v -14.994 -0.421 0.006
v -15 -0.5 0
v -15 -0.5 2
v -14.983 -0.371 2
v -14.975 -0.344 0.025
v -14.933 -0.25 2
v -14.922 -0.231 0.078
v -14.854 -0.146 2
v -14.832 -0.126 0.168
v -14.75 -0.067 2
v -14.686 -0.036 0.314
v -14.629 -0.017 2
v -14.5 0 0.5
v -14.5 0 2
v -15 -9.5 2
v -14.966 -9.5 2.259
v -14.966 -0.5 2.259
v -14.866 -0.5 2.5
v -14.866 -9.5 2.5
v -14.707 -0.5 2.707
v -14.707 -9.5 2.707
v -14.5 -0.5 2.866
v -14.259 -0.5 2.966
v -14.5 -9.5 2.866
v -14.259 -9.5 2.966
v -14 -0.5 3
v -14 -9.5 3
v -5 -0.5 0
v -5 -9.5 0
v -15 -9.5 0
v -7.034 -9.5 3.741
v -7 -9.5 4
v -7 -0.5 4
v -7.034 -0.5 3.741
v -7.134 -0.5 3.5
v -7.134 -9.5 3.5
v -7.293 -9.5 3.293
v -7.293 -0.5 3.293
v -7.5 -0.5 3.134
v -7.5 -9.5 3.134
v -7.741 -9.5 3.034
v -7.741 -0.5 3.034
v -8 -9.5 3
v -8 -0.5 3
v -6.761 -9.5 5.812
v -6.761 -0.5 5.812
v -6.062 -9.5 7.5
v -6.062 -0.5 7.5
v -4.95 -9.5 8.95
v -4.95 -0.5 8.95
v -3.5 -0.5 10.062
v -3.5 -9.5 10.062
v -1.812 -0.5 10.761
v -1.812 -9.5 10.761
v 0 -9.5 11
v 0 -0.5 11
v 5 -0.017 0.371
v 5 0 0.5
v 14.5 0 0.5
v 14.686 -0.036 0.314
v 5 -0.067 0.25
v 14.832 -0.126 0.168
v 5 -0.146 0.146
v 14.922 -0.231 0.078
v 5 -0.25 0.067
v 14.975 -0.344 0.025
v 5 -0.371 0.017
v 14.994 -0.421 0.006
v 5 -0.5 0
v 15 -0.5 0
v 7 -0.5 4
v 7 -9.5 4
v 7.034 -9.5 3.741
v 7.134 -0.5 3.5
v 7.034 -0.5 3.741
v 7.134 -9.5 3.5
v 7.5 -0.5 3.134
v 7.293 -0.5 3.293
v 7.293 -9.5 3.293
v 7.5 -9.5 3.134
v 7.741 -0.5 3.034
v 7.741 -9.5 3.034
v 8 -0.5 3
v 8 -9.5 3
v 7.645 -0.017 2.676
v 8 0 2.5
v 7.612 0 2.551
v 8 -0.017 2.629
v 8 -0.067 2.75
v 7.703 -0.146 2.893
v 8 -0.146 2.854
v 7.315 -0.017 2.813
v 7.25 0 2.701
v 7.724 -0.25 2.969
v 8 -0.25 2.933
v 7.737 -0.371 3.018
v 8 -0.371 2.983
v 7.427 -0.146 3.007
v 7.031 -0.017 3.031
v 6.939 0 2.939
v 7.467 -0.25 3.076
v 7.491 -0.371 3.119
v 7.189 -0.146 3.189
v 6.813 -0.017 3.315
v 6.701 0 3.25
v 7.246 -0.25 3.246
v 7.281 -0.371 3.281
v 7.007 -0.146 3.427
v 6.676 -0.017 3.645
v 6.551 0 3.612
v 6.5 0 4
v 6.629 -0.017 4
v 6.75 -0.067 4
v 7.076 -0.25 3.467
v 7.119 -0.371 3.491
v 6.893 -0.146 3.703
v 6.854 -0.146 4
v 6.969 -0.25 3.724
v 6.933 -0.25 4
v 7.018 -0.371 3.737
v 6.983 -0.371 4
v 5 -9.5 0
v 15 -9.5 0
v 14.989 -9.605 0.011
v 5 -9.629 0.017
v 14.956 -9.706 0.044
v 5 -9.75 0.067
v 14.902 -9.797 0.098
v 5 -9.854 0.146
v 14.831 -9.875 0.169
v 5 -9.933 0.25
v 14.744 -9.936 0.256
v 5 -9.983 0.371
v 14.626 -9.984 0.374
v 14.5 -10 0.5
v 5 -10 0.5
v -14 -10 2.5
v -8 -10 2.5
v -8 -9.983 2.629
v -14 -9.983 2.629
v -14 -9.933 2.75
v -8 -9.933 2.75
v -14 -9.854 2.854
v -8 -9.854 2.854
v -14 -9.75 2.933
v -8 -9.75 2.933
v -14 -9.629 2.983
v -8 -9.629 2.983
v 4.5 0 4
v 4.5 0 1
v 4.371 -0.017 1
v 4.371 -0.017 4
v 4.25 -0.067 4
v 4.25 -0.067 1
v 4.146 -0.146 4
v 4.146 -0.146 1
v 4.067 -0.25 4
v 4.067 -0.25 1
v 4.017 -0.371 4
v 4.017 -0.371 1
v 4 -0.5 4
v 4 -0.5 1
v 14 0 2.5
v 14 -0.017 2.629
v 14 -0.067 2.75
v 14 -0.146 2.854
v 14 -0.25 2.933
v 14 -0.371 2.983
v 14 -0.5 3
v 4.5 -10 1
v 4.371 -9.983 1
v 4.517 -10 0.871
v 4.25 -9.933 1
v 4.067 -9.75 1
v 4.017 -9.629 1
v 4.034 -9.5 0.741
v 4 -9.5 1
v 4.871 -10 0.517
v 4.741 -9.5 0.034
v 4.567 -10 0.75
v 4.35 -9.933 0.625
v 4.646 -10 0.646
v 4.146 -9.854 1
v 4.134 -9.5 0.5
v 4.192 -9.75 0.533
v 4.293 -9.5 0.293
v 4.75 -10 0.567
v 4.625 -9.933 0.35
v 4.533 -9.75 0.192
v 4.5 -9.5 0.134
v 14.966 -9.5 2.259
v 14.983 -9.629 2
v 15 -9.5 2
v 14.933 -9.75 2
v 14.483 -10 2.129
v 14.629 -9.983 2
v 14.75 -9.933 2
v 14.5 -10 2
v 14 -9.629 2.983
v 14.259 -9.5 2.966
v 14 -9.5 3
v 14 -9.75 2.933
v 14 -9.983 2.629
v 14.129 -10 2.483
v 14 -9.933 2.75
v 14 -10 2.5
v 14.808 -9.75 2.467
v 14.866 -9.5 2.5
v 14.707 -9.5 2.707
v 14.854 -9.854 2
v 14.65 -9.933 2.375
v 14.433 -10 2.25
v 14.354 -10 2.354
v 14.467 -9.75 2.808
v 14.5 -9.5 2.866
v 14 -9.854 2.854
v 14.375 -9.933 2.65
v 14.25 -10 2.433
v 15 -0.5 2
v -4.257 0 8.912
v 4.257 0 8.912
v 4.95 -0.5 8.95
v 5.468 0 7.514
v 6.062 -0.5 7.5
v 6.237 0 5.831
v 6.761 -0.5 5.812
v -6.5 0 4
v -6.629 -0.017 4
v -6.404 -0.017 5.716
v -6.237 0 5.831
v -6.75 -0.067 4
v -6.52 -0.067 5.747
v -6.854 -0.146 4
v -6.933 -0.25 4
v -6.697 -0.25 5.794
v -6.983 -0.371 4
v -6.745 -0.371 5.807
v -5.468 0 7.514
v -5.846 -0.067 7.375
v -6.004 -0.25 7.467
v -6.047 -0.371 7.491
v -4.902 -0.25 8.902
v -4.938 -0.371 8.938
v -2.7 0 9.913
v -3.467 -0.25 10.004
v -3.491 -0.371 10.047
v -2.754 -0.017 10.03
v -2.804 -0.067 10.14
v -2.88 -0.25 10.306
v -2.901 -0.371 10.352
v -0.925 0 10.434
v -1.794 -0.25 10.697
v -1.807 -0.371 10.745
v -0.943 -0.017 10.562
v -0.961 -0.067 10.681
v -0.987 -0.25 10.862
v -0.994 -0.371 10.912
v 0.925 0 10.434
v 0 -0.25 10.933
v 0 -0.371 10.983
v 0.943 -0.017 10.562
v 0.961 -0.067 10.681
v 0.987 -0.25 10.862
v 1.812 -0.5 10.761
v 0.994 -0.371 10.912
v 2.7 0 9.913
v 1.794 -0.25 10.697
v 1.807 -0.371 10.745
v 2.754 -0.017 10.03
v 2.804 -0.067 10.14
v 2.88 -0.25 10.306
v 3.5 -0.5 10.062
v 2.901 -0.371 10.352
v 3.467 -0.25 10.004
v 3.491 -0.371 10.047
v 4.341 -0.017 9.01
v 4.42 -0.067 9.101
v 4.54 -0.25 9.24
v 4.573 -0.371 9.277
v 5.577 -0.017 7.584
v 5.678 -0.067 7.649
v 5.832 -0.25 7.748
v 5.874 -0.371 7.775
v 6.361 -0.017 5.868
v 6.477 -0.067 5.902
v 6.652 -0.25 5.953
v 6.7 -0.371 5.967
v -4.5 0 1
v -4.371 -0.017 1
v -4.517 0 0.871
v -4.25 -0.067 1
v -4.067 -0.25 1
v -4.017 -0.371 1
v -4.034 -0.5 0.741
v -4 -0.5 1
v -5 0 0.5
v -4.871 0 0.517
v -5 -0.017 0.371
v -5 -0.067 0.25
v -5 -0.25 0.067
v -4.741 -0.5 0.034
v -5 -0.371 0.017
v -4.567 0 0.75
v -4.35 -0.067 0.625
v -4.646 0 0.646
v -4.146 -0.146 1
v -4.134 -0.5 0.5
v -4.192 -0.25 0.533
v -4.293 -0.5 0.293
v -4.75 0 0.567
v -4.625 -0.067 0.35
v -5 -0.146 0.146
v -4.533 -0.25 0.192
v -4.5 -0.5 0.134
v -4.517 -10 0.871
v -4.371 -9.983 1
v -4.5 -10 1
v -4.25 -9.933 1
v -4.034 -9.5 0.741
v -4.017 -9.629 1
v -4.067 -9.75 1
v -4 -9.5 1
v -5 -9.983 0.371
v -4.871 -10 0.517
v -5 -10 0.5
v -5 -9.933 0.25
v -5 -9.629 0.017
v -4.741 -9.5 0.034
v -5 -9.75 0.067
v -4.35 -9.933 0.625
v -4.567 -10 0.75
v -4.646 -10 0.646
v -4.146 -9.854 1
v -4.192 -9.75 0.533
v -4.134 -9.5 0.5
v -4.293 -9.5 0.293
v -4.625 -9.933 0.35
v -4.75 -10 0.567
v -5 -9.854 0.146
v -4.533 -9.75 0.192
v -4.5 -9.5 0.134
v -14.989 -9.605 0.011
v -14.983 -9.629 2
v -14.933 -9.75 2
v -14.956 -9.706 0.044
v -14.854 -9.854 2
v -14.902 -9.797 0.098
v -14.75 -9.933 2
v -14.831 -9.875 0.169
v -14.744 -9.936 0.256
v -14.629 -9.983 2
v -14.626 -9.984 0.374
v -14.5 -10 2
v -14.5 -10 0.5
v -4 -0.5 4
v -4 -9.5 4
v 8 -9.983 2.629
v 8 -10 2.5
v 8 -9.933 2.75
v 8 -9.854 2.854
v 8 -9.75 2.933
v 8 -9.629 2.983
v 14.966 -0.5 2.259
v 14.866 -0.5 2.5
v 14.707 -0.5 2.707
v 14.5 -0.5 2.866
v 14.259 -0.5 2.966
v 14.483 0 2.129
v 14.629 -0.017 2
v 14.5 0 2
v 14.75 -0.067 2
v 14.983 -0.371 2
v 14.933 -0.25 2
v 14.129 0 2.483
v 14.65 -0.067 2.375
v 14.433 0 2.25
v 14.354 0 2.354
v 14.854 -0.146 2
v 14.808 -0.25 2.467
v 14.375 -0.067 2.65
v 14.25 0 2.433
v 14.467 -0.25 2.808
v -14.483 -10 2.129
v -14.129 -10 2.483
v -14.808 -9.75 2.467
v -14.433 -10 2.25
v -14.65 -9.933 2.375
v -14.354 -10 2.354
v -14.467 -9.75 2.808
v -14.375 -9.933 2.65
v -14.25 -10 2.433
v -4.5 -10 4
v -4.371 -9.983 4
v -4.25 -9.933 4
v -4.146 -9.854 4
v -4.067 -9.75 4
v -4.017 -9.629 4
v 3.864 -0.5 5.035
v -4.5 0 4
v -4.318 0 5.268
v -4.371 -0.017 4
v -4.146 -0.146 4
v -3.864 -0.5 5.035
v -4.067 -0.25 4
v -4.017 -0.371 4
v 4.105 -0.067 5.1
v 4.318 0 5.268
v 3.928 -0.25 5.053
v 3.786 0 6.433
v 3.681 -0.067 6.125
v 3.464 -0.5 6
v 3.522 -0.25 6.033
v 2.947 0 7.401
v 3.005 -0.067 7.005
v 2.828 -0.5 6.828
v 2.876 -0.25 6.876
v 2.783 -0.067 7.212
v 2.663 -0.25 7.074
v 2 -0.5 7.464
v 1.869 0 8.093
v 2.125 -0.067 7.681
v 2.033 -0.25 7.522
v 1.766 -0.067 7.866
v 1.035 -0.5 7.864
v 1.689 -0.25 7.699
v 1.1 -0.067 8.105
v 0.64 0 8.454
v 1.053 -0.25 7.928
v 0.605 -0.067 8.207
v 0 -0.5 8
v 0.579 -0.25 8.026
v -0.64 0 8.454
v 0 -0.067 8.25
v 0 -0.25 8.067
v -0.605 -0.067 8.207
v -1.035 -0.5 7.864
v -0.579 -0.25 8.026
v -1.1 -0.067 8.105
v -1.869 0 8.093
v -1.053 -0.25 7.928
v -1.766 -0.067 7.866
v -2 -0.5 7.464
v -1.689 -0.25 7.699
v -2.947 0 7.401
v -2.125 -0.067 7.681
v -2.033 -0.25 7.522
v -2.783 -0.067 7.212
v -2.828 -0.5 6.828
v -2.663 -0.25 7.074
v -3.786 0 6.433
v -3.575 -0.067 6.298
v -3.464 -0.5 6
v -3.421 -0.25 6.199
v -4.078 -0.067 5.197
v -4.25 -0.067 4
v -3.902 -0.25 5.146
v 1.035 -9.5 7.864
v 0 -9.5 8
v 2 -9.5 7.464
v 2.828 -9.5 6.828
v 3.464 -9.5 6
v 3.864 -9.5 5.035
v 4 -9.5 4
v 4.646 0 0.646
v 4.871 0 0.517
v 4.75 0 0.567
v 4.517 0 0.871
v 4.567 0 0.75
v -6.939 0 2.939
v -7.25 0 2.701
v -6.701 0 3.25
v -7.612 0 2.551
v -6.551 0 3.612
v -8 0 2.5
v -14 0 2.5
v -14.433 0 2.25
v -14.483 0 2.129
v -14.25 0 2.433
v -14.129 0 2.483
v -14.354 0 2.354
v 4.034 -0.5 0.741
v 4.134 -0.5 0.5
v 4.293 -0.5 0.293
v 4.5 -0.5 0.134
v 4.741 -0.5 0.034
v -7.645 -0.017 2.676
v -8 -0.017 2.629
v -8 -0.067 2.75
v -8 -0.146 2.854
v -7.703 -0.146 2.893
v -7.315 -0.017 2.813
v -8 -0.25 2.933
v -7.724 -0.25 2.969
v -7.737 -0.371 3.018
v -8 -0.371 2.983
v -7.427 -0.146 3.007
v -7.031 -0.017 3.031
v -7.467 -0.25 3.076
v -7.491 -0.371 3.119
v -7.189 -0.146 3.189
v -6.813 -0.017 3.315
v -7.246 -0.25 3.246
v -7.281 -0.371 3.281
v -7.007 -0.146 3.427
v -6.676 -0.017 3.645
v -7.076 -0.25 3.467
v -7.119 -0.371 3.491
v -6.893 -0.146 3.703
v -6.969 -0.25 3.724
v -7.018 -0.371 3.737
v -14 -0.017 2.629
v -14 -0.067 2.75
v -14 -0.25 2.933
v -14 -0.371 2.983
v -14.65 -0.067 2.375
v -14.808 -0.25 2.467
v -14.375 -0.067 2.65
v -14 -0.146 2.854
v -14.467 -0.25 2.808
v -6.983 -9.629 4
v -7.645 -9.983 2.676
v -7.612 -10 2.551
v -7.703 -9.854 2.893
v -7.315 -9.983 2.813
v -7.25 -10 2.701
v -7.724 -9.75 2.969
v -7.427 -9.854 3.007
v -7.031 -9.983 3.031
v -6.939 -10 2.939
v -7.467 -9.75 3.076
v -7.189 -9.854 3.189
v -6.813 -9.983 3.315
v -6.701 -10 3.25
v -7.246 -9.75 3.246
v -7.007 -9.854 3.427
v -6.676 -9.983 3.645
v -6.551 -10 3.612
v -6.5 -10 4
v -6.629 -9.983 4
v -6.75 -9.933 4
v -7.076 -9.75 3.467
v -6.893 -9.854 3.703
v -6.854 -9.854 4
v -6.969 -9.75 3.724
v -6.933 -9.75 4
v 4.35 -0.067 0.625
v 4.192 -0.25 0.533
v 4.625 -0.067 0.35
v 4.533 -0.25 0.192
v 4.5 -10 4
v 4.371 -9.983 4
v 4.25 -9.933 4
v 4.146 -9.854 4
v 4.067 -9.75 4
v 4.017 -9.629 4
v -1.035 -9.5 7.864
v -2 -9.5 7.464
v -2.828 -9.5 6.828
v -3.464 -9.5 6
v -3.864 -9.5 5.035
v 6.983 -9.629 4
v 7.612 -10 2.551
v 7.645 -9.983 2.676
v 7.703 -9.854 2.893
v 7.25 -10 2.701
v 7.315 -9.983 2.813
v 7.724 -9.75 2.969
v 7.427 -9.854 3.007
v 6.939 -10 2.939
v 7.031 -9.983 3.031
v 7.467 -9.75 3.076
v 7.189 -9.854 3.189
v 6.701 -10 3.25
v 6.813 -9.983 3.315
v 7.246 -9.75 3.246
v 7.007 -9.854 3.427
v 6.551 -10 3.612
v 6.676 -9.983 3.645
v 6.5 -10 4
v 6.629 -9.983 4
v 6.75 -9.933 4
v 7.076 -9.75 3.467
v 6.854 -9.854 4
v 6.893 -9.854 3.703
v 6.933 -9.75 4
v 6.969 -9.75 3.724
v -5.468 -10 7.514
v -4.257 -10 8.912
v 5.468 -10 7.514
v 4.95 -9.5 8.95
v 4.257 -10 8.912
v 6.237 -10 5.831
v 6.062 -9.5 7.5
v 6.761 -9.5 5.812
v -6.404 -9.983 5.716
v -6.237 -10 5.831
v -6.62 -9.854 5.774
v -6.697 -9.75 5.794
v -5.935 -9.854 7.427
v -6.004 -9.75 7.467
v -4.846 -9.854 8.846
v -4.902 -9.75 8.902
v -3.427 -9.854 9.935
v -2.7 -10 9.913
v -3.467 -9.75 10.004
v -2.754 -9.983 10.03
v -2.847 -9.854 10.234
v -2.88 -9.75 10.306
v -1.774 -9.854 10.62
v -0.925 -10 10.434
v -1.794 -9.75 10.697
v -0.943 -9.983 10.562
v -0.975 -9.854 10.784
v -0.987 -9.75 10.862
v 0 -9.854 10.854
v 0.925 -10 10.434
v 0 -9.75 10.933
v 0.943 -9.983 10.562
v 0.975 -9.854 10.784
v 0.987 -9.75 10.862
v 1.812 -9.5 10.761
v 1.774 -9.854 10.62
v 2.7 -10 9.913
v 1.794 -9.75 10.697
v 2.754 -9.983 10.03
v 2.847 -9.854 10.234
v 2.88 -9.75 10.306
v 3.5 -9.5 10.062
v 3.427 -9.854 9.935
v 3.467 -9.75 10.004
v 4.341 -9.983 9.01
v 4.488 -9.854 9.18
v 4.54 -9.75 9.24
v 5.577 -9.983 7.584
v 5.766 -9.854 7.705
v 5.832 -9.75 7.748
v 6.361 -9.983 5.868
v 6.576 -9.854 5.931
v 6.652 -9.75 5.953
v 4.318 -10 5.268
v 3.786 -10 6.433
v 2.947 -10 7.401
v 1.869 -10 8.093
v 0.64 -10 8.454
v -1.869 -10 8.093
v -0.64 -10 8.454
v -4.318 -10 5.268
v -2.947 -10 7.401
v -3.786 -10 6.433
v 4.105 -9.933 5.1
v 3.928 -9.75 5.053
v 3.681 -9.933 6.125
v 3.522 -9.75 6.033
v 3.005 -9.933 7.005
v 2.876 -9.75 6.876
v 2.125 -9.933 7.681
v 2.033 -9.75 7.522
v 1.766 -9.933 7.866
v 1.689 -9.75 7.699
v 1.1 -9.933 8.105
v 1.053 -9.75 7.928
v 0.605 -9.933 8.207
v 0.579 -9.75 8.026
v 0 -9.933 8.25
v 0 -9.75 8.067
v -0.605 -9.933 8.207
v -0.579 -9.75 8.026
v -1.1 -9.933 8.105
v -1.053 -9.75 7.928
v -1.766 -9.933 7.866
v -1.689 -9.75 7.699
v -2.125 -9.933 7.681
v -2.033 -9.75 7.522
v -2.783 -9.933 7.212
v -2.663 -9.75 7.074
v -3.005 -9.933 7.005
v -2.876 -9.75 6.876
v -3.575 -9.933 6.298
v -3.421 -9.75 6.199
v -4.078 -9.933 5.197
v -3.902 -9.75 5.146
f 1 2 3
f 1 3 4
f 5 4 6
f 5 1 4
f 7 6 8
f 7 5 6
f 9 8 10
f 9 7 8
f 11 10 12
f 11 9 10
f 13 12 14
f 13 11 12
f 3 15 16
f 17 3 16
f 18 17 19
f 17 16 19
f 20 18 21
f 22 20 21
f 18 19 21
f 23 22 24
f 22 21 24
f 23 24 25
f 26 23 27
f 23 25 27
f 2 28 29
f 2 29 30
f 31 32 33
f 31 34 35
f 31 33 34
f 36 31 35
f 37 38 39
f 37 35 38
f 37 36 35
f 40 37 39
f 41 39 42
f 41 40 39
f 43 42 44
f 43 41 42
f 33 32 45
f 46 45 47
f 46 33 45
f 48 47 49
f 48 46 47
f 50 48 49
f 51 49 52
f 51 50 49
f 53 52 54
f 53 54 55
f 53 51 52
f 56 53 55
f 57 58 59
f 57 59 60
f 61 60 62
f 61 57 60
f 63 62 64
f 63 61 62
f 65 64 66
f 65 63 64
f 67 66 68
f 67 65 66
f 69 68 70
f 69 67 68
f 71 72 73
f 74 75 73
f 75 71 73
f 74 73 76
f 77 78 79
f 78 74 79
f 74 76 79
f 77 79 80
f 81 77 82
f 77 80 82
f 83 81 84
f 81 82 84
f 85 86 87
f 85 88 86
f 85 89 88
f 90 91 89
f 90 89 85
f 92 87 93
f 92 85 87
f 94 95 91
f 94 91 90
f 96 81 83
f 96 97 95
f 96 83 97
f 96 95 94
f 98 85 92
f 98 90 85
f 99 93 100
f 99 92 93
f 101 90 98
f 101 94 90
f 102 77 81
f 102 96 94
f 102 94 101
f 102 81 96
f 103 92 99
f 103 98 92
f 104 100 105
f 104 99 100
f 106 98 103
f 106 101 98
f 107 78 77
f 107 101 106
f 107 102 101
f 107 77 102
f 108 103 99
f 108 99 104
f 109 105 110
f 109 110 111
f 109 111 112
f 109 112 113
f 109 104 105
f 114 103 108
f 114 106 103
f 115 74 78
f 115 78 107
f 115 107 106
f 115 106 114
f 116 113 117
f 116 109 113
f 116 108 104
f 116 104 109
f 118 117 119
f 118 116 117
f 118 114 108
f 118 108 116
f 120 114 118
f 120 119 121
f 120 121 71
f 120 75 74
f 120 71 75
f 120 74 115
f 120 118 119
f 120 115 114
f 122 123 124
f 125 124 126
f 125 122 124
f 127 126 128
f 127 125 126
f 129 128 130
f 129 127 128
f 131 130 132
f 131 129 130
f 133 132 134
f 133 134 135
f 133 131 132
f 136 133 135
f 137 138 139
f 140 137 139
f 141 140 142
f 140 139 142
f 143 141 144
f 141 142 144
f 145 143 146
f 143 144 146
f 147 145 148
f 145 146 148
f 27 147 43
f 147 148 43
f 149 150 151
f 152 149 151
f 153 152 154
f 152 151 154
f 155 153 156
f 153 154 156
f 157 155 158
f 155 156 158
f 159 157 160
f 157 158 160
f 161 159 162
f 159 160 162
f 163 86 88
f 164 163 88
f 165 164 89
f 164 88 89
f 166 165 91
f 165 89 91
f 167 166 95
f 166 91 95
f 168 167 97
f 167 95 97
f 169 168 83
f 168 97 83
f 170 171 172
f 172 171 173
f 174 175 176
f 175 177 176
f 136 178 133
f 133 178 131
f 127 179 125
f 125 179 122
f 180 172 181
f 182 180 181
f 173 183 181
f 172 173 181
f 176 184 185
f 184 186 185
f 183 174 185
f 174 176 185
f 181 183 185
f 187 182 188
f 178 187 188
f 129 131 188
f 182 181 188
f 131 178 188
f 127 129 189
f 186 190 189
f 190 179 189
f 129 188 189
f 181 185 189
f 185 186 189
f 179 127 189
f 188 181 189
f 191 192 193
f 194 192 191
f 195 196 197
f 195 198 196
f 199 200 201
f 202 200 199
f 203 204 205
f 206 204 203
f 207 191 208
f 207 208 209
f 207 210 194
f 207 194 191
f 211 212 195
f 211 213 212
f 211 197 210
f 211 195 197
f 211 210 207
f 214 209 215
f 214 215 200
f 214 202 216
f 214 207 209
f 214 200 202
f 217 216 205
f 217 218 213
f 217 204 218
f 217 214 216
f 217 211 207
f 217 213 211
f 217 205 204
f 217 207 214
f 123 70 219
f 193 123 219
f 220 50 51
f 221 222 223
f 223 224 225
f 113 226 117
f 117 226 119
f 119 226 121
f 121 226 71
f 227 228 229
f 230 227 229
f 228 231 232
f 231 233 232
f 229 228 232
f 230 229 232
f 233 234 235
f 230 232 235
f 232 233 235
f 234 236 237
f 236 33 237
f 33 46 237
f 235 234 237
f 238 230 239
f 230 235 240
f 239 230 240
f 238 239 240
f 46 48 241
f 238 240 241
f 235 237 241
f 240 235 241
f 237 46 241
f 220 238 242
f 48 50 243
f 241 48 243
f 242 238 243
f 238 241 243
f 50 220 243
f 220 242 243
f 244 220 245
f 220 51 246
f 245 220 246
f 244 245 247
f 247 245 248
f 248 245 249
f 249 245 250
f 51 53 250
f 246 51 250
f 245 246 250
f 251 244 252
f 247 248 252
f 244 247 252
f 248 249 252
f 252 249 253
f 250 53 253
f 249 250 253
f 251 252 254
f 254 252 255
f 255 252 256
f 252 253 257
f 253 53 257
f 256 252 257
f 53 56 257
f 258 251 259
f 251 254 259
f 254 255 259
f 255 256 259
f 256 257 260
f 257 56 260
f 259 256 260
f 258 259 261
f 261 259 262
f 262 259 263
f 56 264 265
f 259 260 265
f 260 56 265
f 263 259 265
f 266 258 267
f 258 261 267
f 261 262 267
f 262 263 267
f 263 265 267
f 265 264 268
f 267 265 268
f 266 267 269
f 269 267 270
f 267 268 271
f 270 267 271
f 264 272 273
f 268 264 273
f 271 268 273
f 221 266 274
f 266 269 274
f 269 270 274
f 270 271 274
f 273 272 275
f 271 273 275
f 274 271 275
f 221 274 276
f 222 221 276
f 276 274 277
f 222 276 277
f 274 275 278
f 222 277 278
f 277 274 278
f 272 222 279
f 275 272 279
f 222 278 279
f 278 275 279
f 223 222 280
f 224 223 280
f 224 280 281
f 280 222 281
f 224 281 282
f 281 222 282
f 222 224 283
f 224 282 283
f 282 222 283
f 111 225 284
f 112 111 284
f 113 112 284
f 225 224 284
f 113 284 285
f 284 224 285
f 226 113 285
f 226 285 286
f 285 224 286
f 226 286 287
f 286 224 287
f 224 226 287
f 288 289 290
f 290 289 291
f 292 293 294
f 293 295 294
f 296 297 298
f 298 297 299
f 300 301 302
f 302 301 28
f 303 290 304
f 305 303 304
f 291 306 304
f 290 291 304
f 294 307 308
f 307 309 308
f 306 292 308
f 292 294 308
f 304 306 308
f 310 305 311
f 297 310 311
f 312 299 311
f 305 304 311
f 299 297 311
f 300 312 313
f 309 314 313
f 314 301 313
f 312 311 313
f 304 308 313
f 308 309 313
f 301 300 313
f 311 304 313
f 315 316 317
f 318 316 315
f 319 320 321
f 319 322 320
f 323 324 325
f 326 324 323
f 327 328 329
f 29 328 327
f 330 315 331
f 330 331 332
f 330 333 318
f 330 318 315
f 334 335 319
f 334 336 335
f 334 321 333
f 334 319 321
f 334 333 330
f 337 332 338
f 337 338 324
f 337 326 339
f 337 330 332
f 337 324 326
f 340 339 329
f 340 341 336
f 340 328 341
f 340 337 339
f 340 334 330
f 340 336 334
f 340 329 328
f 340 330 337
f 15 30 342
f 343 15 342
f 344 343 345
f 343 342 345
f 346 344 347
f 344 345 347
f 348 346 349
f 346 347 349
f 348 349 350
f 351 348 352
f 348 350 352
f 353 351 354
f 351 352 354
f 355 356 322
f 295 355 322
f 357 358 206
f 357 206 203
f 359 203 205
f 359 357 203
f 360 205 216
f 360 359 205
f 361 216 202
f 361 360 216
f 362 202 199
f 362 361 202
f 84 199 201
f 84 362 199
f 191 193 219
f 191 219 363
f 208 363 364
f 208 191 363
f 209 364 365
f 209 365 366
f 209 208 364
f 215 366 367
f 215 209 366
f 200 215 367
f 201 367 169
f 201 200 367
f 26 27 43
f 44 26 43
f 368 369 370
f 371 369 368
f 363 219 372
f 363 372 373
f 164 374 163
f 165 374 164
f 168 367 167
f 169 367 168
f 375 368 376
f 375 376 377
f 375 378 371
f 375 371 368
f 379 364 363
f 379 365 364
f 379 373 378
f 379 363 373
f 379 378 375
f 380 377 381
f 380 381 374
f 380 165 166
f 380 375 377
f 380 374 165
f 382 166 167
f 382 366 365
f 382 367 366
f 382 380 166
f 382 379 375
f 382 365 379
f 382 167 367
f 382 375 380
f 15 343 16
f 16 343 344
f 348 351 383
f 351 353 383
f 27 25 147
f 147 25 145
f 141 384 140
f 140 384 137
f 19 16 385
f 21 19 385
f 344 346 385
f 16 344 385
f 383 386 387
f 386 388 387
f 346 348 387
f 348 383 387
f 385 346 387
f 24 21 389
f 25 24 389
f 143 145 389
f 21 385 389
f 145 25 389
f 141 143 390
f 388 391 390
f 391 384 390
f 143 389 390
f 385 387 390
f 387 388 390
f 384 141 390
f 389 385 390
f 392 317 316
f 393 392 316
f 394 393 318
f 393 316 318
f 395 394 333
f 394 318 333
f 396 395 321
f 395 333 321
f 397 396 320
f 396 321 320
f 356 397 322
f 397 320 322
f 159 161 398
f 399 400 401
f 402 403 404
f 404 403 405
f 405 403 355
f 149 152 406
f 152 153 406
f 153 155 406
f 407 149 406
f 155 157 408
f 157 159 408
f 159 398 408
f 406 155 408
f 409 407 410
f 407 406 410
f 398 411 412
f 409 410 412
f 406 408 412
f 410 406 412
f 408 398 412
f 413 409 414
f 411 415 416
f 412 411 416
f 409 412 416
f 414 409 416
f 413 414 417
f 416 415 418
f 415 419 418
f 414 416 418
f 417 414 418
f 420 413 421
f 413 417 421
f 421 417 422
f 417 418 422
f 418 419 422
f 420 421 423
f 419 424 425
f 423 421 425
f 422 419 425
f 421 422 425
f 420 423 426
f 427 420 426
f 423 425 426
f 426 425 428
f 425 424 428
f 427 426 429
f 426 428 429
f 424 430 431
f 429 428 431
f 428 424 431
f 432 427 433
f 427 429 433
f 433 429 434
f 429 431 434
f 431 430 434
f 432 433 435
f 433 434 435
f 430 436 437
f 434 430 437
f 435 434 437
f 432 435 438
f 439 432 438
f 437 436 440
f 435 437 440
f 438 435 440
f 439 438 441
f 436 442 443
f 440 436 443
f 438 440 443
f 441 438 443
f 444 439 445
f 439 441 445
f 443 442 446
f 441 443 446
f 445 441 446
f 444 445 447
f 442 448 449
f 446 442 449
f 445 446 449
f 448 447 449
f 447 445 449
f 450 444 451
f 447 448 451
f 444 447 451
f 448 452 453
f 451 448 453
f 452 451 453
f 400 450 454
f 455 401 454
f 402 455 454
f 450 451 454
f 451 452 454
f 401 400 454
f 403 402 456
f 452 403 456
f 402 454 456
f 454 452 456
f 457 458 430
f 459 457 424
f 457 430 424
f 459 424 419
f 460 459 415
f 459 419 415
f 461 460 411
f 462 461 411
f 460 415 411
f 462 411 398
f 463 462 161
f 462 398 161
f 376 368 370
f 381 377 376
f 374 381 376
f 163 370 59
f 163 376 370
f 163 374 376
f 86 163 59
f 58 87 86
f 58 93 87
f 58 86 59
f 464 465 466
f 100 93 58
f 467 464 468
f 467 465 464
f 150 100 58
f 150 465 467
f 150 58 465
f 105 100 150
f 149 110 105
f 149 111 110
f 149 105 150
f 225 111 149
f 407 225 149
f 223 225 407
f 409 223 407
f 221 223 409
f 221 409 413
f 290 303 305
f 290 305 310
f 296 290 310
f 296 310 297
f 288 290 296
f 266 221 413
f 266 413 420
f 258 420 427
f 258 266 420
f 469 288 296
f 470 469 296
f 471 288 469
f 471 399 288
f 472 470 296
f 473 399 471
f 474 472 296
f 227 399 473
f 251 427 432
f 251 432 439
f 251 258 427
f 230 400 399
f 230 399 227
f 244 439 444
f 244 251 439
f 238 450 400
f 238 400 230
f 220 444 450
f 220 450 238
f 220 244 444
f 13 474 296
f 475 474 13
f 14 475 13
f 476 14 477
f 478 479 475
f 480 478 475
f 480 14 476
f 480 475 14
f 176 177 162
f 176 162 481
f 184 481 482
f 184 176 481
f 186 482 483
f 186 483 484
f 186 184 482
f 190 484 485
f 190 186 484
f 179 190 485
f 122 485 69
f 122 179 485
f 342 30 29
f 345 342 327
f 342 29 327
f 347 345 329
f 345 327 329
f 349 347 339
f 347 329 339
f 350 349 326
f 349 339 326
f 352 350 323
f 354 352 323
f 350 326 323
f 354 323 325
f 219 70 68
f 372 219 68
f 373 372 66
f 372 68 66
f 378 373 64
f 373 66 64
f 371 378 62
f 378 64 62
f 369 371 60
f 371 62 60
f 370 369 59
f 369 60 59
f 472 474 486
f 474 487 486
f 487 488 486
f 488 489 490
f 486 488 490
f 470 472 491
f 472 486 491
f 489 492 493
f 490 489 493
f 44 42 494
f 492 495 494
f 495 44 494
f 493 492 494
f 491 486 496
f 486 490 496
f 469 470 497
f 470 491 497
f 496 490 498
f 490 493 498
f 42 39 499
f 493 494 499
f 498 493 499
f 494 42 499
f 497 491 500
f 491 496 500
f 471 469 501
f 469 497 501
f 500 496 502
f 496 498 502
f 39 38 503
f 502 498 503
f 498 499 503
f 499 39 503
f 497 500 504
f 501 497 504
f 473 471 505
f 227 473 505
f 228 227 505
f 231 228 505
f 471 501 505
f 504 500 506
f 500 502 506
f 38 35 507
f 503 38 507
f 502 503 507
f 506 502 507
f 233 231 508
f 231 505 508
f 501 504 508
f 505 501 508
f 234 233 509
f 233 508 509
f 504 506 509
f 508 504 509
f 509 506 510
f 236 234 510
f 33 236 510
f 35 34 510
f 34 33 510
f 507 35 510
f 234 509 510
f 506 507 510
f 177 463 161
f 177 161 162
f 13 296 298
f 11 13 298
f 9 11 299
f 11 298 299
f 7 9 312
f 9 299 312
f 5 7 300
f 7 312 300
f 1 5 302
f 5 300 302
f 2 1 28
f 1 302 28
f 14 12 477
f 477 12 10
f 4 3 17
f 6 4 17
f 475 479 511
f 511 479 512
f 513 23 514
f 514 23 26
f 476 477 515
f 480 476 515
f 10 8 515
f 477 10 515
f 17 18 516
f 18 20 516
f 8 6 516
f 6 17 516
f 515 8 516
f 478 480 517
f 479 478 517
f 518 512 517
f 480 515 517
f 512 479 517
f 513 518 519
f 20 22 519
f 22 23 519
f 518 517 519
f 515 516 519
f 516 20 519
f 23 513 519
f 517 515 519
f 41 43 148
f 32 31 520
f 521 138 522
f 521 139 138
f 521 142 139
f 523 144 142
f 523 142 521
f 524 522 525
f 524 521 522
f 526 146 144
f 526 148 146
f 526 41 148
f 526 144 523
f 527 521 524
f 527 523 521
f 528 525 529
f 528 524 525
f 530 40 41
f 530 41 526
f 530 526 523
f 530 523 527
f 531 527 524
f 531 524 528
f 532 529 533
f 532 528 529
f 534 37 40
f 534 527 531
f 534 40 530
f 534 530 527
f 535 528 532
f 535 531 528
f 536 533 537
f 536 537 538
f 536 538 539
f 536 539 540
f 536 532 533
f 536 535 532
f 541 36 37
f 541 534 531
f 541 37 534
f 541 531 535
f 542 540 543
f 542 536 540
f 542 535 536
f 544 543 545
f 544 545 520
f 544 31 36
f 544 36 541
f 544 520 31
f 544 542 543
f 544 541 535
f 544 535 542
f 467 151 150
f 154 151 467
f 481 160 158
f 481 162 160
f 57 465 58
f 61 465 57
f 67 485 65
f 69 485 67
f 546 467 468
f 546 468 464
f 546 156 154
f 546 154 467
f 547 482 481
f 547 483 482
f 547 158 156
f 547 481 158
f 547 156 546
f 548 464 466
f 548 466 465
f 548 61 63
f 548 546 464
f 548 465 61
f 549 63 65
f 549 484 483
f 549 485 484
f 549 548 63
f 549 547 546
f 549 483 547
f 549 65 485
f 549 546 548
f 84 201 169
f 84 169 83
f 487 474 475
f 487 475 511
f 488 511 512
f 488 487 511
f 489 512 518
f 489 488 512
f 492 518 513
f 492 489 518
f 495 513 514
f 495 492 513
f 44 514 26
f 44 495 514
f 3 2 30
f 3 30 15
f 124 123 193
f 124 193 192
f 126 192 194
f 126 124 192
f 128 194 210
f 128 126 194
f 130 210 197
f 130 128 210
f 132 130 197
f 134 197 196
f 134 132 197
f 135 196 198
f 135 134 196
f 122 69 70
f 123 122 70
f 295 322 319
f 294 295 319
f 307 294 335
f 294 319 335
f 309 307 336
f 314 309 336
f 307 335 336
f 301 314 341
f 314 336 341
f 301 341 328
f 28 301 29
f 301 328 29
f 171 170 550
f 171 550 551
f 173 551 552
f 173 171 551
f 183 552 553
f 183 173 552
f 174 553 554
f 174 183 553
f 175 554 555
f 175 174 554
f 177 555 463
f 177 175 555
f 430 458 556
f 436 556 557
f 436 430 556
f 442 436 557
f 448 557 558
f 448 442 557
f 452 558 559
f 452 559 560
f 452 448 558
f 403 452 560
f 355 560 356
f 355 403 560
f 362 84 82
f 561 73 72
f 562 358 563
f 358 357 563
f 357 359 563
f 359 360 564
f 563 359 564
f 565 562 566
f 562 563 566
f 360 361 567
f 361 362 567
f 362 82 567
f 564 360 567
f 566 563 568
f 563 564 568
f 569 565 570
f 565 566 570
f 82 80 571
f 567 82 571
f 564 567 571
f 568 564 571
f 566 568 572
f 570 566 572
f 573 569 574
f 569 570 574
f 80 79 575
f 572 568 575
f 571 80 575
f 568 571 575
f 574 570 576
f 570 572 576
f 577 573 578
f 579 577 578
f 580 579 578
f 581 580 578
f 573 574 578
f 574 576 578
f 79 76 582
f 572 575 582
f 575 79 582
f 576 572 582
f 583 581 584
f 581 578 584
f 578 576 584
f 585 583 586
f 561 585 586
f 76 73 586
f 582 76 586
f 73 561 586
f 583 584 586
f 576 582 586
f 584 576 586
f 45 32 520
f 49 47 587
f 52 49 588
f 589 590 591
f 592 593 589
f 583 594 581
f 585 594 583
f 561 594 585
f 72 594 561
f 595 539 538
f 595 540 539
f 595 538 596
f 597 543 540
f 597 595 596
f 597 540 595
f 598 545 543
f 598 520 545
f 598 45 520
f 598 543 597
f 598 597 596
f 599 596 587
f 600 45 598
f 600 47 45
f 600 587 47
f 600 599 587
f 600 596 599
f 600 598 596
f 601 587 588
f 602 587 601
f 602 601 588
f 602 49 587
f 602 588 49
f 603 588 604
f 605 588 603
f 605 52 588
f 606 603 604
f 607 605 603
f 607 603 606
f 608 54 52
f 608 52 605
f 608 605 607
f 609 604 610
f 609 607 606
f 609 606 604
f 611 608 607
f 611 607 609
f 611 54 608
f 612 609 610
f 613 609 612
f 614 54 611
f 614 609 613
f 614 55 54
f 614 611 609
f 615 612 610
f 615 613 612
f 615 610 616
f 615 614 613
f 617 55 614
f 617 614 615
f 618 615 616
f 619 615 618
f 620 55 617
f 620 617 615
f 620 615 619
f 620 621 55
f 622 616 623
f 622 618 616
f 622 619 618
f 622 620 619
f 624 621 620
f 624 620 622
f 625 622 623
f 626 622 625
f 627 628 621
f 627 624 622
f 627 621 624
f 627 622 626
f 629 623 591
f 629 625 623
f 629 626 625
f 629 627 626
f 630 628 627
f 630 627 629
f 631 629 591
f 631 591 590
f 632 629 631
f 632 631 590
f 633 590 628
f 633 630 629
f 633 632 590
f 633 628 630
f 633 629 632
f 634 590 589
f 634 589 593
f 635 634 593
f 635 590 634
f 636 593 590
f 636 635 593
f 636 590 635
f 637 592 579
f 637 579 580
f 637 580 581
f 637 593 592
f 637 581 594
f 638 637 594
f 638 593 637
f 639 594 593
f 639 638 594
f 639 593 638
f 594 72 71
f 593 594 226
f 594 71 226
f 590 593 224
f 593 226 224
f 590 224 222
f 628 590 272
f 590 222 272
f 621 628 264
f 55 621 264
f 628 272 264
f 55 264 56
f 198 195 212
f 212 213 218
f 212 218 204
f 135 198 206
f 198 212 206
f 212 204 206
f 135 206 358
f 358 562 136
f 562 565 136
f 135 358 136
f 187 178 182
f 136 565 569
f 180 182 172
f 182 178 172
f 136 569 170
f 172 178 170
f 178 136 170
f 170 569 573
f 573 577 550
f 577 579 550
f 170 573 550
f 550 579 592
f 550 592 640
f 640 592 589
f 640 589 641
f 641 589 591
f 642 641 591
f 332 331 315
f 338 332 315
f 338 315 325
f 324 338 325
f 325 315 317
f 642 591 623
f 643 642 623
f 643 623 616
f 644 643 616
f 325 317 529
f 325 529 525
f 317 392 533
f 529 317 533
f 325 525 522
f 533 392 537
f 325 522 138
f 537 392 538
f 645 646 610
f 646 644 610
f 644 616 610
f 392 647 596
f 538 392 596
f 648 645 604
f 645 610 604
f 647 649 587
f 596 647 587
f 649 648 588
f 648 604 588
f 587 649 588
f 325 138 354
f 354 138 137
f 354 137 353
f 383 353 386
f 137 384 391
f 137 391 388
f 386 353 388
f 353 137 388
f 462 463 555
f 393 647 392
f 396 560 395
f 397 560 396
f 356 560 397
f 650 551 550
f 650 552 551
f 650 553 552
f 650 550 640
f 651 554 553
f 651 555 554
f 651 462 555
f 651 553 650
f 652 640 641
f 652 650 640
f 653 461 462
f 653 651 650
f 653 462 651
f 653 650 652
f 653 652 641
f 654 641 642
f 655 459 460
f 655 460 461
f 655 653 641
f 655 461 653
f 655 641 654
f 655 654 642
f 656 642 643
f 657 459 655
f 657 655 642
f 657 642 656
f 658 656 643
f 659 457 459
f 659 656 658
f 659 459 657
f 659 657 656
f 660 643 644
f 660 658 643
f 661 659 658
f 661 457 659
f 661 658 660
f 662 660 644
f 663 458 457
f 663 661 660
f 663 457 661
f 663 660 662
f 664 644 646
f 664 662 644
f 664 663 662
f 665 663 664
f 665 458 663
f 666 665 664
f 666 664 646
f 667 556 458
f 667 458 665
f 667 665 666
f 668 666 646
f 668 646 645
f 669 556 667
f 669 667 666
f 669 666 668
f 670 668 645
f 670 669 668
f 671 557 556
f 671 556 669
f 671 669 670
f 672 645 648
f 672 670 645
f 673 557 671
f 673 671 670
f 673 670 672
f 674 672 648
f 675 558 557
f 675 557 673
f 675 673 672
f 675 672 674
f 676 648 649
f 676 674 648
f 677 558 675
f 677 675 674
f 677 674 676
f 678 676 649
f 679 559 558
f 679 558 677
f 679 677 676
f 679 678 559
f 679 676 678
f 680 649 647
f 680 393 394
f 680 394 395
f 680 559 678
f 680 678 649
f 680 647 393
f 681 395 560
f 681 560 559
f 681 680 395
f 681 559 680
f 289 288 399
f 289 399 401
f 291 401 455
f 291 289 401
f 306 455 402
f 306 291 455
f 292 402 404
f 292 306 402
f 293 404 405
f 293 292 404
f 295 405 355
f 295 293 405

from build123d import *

# Parameters (mm, degrees)
F1_DEPTH     = 10
F2_R         = 0.99999
F3_T1_DEPTH  = 1e-05
F3_T3_DEPTH  = 3.00001
F3_T5_DEPTH  = 11.25001
F3_T7_DEPTH  = 6.00002
F3_T9_DEPTH  = 3.25001
F3_T12_ANGLE = 107.9121236547
F3_T14_ANGLE = 100.2354992312
F3_T16_ANGLE = 90
F3_T18_ANGLE = 107.9121236547
F3_T20_ANGLE = 90
F3_T22_ANGLE = 100.2354992312
F3_T24_ANGLE = 90
F3_T26_ANGLE = 90
F3_T28_ANGLE = 90
F3_T30_ANGLE = 90


# Not quite as in the source:
# - a fillet or chamfer that OpenCascade refuses, or shapes differently, is made with other operations: its cross-section is extruded or revolved along the edge and cut away or added
# - a fillet or chamfer is up to 0.001 mm smaller than in the source, because OpenCascade refuses the exact size


with BuildPart() as f1:
    # F0 (on Front) → F1 (new body)
    with BuildSketch(Plane.XZ):
        with BuildLine():
            Line((7, 3), (7, 4))
            ThreePointArc((7, 4), (6.6787700412, 1.9038056538), (5.7445626465, 0))
            Line((5.7445626465, 0), (7, 0))
            Line((7, 0), (15, 0))
            Line((15, 0), (15, 3))
            Line((15, 3), (7, 3))
        make_face()
        with BuildLine():
            Line((7, 4), (4, 4))
            Line((4, 4), (4, 0))
            Line((4, 0), (5.7445626465, 0))
            ThreePointArc((5.7445626465, 0), (6.6787700412, 1.9038056538), (7, 4))
        make_face()
        with BuildLine():
            Line((0, 11), (0, 8))
            ThreePointArc((0, 8), (2.8284271247, 6.8284271247), (4, 4))
            Line((4, 4), (7, 4))
            ThreePointArc((7, 4), (4.9497474683, 8.9497474683), (0, 11))
        make_face()
    extrude(amount=F1_DEPTH)

    # F2 (radius 1 in the source; OpenCascade refuses exactly that, so slightly less here)
    f2_edges = [f1.edges().sort_by_distance(p)[0] for p in [
        (7, -5, 3),
        (4, -5, 0),
        (15, -5, 3),
    ]]
    fillet(f2_edges, radius=F2_R)

    # F3: fillet of radius 0.5 on 5 edges, made by hand

    # F3_s2 → F3_t1 (cut)
    with BuildSketch(Plane.XY.offset(3.99999)):
        with BuildLine():
            ThreePointArc((6.5, -10), (6.8535533906, -9.8535533906), (7, -9.5))
            Line((7, -9.5), (7, -10))
            Line((7, -10), (6.5, -10))
        make_face()
        with BuildLine():
            ThreePointArc((6.5, 0), (6.8535533906, -0.1464466094), (7, -0.5))
            Line((7, -0.5), (7, 0))
            Line((7, 0), (6.5, 0))
        make_face()
    extrude(amount=F3_T1_DEPTH, mode=Mode.SUBTRACT)

    # F3_s4 → F3_t3 (cut)
    with BuildSketch(Plane.XY.offset(0.99999)):
        with BuildLine():
            ThreePointArc((4.5, 0), (4.1464466094, -0.1464466094), (4, -0.5))
            Line((4, -0.5), (4, 0))
            Line((4, 0), (4.5, 0))
        make_face()
        with BuildLine():
            ThreePointArc((4.5, -10), (4.1464466094, -9.8535533906), (4, -9.5))
            Line((4, -9.5), (4, -10))
            Line((4, -10), (4.5, -10))
        make_face()
    extrude(amount=F3_T3_DEPTH, mode=Mode.SUBTRACT)

    # F3_s6 → F3_t5 (cut)
    with BuildSketch(Plane.YZ.offset(4.99999)):
        with BuildLine():
            ThreePointArc((0, 0.5), (-0.1464466094, 0.1464466094), (-0.5, 0))
            Line((-0.5, 0), (0, 0))
            Line((0, 0), (0, 0.5))
        make_face()
        with BuildLine():
            ThreePointArc((-9.5, 0), (-9.8535533906, 0.1464466094), (-10, 0.5))
            Line((-10, 0.5), (-10, 0))
            Line((-10, 0), (-9.5, 0))
        make_face()
    extrude(amount=F3_T5_DEPTH, mode=Mode.SUBTRACT)

    # F3_s8 → F3_t7 (cut)
    with BuildSketch(Plane.YZ.offset(7.99999)):
        with BuildLine():
            ThreePointArc((0, 2.5), (-0.1464466094, 2.8535533906), (-0.5, 3))
            Line((-0.5, 3), (0, 3))
            Line((0, 3), (0, 2.5))
        make_face()
        with BuildLine():
            ThreePointArc((-10, 2.5), (-9.8535533906, 2.8535533906), (-9.5, 3))
            Line((-9.5, 3), (-10, 3))
            Line((-10, 3), (-10, 2.5))
        make_face()
    extrude(amount=F3_T7_DEPTH, mode=Mode.SUBTRACT)

    # F3_s10 → F3_t9 (cut)
    with BuildSketch(Plane.XY.offset(-1.25)):
        with BuildLine():
            ThreePointArc((15, -0.5), (14.8535533906, -0.1464466094), (14.5, 0))
            Line((14.5, 0), (15, 0))
            Line((15, 0), (15, -0.5))
        make_face()
        with BuildLine():
            ThreePointArc((15, -9.5), (14.8535533906, -9.8535533906), (14.5, -10))
            Line((14.5, -10), (15, -10))
            Line((15, -10), (15, -9.5))
        make_face()
    extrude(amount=F3_T9_DEPTH, mode=Mode.SUBTRACT)

    # F3_s11 → F3_t12 (revolve, cut)
    with BuildSketch(Plane(origin=(1.1706017221, 0, 0.37836761), x_dir=(0, 1, 0), z_dir=(-0.9515293466, 0, -0.3075579661))):
        with BuildLine():
            ThreePointArc((-10, -8.3061173865), (-9.8535533906, -7.9525639959), (-9.5, -7.8061173865))
            Line((-9.5, -7.8061173865), (-10, -7.8061173865))
            Line((-10, -7.8061173865), (-10, -8.3061173865))
        make_face()
    revolve(axis=Axis((0, -10, 4), (0, 1, 0)), revolution_arc=F3_T12_ANGLE, mode=Mode.SUBTRACT)

    # F3_s13 → F3_t14 (revolve, cut)
    with BuildSketch(Plane.XY.offset(4)):
        with BuildLine():
            ThreePointArc((6.5, -10), (6.8535533906, -9.8535533906), (7, -9.5))
            Line((7, -9.5), (7, -10))
            Line((7, -10), (6.5, -10))
        make_face()
    revolve(axis=Axis((0, -10, 4), (0, -1, 0)), revolution_arc=F3_T14_ANGLE, mode=Mode.SUBTRACT)

    # F3_s15 → F3_t16 (revolve, cut)
    with BuildSketch(Plane.YZ.offset(7.99999)):
        with BuildLine():
            ThreePointArc((0, 2.5), (-0.1464466094, 2.8535533906), (-0.5, 3))
            Line((-0.5, 3), (0, 3))
            Line((0, 3), (0, 2.5))
        make_face()
    revolve(axis=Axis((7.99999, 0, 3.99999), (0, 1, 0)), revolution_arc=F3_T16_ANGLE, mode=Mode.SUBTRACT)

    # F3_s17 → F3_t18 (revolve, cut)
    with BuildSketch(Plane(origin=(1.1706017221, 0, 0.37836761), x_dir=(0, 1, 0), z_dir=(-0.9515293466, 0, -0.3075579661))):
        with BuildLine():
            ThreePointArc((0, -8.3061173865), (-0.1464466094, -7.9525639959), (-0.5, -7.8061173865))
            Line((-0.5, -7.8061173865), (0, -7.8061173865))
            Line((0, -7.8061173865), (0, -8.3061173865))
        make_face()
    revolve(axis=Axis((0, 0, 4), (0, 1, 0)), revolution_arc=F3_T18_ANGLE, mode=Mode.SUBTRACT)

    # F3_s19 → F3_t20 (revolve, cut)
    with BuildSketch(Plane.XY.offset(0.99999)):
        with BuildLine():
            ThreePointArc((4.5, 0), (4.1464466094, -0.1464466094), (4, -0.5))
            Line((4, -0.5), (4, 0))
            Line((4, 0), (4.5, 0))
        make_face()
    revolve(axis=Axis((4.99999, 0, 0.99999), (0, -1, 0)), revolution_arc=F3_T20_ANGLE, mode=Mode.SUBTRACT)

    # F3_s21 → F3_t22 (revolve, cut)
    with BuildSketch(Plane.XY.offset(4)):
        with BuildLine():
            ThreePointArc((6.5, 0), (6.8535533906, -0.1464466094), (7, -0.5))
            Line((7, -0.5), (7, 0))
            Line((7, 0), (6.5, 0))
        make_face()
    revolve(axis=Axis((0, 0, 4), (0, -1, 0)), revolution_arc=F3_T22_ANGLE, mode=Mode.SUBTRACT)

    # F3_s23 → F3_t24 (revolve, cut)
    with BuildSketch(Plane.XY.offset(2.00001)):
        with BuildLine():
            ThreePointArc((14.5, 0), (14.8535533906, -0.1464466094), (15, -0.5))
            Line((15, -0.5), (15, 0))
            Line((15, 0), (14.5, 0))
        make_face()
    revolve(axis=Axis((14.00001, 0, 2.00001), (0, -1, 0)), revolution_arc=F3_T24_ANGLE, mode=Mode.SUBTRACT)

    # F3_s25 → F3_t26 (revolve, cut)
    with BuildSketch(Plane.YZ.offset(7.99999)):
        with BuildLine():
            ThreePointArc((-10, 2.5), (-9.8535533906, 2.8535533906), (-9.5, 3))
            Line((-9.5, 3), (-10, 3))
            Line((-10, 3), (-10, 2.5))
        make_face()
    revolve(axis=Axis((7.99999, -10, 3.99999), (0, 1, 0)), revolution_arc=F3_T26_ANGLE, mode=Mode.SUBTRACT)

    # F3_s27 → F3_t28 (revolve, cut)
    with BuildSketch(Plane.XY.offset(2.00001)):
        with BuildLine():
            ThreePointArc((15, -9.5), (14.8535533906, -9.8535533906), (14.5, -10))
            Line((14.5, -10), (15, -10))
            Line((15, -10), (15, -9.5))
        make_face()
    revolve(axis=Axis((14.00001, -10, 2.00001), (0, -1, 0)), revolution_arc=F3_T28_ANGLE, mode=Mode.SUBTRACT)

    # F3_s29 → F3_t30 (revolve, cut)
    with BuildSketch(Plane.XY.offset(0.99999)):
        with BuildLine():
            ThreePointArc((4.5, -10), (4.1464466094, -9.8535533906), (4, -9.5))
            Line((4, -9.5), (4, -10))
            Line((4, -10), (4.5, -10))
        make_face()
    revolve(axis=Axis((4.99999, -10, 0.99999), (0, -1, 0)), revolution_arc=F3_T30_ANGLE, mode=Mode.SUBTRACT)

    # F4: F1 across face


with BuildPart() as f1_1:
    add(f1.part)
    add(f1.part.mirror(Plane(origin=(0, -5, 9.5), x_dir=(0, -1, 0), z_dir=(-1, 0, 0))))


solid = f1_1.part
